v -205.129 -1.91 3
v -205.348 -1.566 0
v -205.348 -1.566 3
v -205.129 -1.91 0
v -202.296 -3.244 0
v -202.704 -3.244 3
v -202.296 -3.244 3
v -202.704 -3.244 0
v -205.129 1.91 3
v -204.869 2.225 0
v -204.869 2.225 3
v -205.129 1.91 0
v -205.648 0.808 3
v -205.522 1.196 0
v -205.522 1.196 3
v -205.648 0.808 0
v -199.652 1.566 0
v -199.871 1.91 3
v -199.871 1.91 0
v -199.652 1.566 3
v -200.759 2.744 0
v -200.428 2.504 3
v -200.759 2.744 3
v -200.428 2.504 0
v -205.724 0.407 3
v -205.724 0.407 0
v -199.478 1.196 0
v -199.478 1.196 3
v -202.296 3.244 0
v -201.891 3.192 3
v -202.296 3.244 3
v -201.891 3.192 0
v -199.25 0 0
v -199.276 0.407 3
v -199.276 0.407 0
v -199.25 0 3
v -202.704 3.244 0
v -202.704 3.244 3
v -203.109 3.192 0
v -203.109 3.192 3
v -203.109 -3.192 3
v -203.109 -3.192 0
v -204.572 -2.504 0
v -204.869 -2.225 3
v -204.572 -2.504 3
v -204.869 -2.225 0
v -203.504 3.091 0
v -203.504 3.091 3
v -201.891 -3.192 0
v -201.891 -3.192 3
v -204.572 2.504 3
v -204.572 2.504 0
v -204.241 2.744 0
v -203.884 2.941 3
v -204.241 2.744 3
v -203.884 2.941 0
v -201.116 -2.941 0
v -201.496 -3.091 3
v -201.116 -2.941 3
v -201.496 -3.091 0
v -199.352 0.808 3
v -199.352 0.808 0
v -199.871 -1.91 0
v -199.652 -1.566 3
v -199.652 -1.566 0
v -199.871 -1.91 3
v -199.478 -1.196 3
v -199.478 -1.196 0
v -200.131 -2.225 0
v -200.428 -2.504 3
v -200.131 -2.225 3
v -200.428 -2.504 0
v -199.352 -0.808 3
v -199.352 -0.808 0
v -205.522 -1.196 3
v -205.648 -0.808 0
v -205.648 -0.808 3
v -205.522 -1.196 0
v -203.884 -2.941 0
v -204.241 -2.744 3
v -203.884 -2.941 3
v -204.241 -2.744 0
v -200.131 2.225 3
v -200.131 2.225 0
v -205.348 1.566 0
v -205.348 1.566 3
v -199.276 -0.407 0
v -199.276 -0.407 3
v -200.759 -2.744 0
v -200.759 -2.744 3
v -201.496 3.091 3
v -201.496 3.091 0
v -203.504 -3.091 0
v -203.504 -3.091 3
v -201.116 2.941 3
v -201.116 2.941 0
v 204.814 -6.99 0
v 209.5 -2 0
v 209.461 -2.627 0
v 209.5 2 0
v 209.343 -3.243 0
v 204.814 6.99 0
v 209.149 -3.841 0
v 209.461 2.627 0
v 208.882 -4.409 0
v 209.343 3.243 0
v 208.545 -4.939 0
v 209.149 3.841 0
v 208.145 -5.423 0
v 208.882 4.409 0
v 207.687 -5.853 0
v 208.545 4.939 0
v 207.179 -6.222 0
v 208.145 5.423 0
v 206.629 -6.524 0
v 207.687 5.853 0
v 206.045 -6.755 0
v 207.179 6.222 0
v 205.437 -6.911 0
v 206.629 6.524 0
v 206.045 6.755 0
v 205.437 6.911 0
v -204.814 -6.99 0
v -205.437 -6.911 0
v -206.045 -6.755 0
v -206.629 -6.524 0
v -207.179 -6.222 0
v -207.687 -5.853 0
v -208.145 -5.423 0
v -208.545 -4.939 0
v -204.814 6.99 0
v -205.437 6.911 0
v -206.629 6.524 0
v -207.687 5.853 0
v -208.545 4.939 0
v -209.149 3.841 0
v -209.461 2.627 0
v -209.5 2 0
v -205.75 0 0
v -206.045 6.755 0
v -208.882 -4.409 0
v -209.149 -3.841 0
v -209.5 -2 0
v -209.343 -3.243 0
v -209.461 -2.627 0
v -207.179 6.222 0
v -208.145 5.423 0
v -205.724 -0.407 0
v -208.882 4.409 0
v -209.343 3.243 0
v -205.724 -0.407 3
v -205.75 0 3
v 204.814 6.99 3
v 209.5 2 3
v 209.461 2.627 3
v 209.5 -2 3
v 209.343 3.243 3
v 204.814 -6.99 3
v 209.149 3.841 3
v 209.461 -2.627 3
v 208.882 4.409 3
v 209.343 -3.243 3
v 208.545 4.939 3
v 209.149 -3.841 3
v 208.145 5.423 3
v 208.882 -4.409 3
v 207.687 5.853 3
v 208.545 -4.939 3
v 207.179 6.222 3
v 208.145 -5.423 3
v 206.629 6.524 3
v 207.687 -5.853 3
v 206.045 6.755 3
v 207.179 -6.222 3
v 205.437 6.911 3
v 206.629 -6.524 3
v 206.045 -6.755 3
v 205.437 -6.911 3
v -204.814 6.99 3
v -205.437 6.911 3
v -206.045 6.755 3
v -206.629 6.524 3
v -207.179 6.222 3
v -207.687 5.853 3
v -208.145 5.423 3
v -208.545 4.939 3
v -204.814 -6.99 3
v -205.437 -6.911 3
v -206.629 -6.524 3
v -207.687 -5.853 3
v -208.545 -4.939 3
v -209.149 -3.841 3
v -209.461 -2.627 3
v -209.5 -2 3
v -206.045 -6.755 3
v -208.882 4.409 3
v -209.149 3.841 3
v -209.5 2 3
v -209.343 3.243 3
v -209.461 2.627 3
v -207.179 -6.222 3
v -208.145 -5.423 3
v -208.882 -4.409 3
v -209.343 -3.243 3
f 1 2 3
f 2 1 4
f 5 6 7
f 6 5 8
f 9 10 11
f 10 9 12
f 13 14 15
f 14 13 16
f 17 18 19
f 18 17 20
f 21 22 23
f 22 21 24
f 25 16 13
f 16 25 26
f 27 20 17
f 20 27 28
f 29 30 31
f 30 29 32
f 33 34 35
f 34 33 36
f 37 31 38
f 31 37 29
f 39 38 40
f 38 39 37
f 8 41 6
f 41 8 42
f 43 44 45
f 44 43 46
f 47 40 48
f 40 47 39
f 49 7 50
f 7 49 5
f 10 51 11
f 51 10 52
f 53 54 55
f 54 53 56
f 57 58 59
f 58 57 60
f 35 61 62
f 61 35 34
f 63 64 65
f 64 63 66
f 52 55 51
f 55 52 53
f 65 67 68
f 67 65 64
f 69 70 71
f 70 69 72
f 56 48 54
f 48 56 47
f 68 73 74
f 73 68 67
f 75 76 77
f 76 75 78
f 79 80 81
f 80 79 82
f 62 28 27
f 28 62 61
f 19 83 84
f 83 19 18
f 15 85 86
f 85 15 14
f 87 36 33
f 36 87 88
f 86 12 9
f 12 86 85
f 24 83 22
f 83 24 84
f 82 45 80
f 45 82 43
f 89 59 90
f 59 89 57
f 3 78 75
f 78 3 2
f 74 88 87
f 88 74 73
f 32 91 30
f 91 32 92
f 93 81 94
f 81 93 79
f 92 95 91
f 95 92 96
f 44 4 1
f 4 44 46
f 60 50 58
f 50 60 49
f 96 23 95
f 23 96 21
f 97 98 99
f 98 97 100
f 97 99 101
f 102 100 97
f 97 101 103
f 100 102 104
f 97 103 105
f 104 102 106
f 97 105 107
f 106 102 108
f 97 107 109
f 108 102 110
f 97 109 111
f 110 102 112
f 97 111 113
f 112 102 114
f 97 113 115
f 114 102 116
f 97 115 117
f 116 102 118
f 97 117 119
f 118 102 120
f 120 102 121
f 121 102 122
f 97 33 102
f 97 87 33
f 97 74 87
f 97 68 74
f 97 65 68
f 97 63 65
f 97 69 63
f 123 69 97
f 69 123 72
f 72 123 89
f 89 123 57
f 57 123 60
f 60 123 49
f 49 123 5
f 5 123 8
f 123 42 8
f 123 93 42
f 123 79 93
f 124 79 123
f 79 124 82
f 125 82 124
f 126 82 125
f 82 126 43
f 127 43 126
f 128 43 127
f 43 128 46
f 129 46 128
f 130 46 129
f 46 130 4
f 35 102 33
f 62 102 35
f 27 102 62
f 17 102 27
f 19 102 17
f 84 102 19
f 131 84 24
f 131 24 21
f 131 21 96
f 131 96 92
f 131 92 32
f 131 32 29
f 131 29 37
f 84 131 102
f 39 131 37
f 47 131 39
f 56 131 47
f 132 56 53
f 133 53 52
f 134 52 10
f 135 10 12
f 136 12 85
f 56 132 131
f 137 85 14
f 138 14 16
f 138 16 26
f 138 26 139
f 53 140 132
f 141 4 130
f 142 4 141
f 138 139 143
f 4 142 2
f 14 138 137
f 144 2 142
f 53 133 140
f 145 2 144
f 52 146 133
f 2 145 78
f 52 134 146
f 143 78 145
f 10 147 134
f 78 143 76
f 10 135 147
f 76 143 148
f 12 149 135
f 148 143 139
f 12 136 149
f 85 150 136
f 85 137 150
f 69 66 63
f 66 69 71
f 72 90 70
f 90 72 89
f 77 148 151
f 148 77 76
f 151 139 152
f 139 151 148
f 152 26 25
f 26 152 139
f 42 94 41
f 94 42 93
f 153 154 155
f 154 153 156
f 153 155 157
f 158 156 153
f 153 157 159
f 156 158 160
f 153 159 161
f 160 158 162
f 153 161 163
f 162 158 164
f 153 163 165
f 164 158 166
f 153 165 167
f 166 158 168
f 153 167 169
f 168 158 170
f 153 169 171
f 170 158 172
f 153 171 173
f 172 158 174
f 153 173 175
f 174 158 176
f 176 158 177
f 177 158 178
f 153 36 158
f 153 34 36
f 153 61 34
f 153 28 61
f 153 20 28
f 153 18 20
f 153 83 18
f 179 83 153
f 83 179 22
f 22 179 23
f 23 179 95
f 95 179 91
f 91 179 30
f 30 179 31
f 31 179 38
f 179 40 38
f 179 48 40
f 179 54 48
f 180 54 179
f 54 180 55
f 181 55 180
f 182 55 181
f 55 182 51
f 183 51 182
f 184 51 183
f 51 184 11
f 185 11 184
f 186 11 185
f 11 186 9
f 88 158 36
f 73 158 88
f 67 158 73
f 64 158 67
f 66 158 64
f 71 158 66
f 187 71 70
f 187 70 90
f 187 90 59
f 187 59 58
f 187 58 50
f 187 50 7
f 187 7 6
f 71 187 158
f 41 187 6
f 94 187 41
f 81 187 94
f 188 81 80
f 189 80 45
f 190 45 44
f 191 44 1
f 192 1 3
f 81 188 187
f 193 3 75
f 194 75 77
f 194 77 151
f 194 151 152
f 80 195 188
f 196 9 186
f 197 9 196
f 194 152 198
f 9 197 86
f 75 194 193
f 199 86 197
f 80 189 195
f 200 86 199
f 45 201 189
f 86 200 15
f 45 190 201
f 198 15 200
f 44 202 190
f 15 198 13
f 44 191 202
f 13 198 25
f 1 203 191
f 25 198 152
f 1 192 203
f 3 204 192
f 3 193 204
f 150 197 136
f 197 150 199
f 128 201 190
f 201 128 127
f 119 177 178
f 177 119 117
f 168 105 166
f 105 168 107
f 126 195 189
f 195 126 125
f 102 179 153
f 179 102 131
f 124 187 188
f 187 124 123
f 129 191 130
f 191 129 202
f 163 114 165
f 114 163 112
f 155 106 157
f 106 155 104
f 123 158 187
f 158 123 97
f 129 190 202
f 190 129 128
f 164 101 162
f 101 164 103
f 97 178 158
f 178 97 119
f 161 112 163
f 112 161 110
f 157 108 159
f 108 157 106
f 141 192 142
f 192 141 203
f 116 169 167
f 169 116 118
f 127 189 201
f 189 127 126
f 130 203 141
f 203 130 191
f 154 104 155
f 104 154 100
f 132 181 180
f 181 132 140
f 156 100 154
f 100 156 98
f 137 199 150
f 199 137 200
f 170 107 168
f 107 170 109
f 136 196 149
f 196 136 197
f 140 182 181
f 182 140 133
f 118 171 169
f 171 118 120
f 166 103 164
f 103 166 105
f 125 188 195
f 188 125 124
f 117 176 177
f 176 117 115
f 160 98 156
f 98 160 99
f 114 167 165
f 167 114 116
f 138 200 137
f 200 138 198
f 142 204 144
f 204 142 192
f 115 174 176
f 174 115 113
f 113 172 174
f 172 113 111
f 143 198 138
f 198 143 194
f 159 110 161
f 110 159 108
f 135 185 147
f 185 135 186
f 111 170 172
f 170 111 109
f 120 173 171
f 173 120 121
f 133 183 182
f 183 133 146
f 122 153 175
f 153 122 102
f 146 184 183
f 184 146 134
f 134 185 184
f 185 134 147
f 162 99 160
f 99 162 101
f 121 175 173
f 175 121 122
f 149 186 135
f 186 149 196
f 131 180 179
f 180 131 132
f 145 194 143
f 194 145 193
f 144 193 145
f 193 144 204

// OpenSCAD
$fn = 50;


difference() {
	union() {
		hull() {
			translate(v = [-204.5000000000, 2.0000000000, 0]) {
				cylinder(h = 3, r = 5);
			}
			translate(v = [204.5000000000, 2.0000000000, 0]) {
				cylinder(h = 3, r = 5);
			}
			translate(v = [-204.5000000000, -2.0000000000, 0]) {
				cylinder(h = 3, r = 5);
			}
			translate(v = [204.5000000000, -2.0000000000, 0]) {
				cylinder(h = 3, r = 5);
			}
		}
	}
	union() {
		translate(v = [-202.5000000000, 0.0000000000, 0]) {
			cylinder(h = 3, r = 3.2500000000);
		}
		translate(v = [-202.5000000000, 0.0000000000, 0]) {
			cylinder(h = 3, r = 1.8000000000);
		}
		translate(v = [-202.5000000000, 0.0000000000, 0]) {
			cylinder(h = 3, r = 1.8000000000);
		}
		translate(v = [-202.5000000000, 0.0000000000, 0]) {
			cylinder(h = 3, r = 1.8000000000);
		}
	}
}
